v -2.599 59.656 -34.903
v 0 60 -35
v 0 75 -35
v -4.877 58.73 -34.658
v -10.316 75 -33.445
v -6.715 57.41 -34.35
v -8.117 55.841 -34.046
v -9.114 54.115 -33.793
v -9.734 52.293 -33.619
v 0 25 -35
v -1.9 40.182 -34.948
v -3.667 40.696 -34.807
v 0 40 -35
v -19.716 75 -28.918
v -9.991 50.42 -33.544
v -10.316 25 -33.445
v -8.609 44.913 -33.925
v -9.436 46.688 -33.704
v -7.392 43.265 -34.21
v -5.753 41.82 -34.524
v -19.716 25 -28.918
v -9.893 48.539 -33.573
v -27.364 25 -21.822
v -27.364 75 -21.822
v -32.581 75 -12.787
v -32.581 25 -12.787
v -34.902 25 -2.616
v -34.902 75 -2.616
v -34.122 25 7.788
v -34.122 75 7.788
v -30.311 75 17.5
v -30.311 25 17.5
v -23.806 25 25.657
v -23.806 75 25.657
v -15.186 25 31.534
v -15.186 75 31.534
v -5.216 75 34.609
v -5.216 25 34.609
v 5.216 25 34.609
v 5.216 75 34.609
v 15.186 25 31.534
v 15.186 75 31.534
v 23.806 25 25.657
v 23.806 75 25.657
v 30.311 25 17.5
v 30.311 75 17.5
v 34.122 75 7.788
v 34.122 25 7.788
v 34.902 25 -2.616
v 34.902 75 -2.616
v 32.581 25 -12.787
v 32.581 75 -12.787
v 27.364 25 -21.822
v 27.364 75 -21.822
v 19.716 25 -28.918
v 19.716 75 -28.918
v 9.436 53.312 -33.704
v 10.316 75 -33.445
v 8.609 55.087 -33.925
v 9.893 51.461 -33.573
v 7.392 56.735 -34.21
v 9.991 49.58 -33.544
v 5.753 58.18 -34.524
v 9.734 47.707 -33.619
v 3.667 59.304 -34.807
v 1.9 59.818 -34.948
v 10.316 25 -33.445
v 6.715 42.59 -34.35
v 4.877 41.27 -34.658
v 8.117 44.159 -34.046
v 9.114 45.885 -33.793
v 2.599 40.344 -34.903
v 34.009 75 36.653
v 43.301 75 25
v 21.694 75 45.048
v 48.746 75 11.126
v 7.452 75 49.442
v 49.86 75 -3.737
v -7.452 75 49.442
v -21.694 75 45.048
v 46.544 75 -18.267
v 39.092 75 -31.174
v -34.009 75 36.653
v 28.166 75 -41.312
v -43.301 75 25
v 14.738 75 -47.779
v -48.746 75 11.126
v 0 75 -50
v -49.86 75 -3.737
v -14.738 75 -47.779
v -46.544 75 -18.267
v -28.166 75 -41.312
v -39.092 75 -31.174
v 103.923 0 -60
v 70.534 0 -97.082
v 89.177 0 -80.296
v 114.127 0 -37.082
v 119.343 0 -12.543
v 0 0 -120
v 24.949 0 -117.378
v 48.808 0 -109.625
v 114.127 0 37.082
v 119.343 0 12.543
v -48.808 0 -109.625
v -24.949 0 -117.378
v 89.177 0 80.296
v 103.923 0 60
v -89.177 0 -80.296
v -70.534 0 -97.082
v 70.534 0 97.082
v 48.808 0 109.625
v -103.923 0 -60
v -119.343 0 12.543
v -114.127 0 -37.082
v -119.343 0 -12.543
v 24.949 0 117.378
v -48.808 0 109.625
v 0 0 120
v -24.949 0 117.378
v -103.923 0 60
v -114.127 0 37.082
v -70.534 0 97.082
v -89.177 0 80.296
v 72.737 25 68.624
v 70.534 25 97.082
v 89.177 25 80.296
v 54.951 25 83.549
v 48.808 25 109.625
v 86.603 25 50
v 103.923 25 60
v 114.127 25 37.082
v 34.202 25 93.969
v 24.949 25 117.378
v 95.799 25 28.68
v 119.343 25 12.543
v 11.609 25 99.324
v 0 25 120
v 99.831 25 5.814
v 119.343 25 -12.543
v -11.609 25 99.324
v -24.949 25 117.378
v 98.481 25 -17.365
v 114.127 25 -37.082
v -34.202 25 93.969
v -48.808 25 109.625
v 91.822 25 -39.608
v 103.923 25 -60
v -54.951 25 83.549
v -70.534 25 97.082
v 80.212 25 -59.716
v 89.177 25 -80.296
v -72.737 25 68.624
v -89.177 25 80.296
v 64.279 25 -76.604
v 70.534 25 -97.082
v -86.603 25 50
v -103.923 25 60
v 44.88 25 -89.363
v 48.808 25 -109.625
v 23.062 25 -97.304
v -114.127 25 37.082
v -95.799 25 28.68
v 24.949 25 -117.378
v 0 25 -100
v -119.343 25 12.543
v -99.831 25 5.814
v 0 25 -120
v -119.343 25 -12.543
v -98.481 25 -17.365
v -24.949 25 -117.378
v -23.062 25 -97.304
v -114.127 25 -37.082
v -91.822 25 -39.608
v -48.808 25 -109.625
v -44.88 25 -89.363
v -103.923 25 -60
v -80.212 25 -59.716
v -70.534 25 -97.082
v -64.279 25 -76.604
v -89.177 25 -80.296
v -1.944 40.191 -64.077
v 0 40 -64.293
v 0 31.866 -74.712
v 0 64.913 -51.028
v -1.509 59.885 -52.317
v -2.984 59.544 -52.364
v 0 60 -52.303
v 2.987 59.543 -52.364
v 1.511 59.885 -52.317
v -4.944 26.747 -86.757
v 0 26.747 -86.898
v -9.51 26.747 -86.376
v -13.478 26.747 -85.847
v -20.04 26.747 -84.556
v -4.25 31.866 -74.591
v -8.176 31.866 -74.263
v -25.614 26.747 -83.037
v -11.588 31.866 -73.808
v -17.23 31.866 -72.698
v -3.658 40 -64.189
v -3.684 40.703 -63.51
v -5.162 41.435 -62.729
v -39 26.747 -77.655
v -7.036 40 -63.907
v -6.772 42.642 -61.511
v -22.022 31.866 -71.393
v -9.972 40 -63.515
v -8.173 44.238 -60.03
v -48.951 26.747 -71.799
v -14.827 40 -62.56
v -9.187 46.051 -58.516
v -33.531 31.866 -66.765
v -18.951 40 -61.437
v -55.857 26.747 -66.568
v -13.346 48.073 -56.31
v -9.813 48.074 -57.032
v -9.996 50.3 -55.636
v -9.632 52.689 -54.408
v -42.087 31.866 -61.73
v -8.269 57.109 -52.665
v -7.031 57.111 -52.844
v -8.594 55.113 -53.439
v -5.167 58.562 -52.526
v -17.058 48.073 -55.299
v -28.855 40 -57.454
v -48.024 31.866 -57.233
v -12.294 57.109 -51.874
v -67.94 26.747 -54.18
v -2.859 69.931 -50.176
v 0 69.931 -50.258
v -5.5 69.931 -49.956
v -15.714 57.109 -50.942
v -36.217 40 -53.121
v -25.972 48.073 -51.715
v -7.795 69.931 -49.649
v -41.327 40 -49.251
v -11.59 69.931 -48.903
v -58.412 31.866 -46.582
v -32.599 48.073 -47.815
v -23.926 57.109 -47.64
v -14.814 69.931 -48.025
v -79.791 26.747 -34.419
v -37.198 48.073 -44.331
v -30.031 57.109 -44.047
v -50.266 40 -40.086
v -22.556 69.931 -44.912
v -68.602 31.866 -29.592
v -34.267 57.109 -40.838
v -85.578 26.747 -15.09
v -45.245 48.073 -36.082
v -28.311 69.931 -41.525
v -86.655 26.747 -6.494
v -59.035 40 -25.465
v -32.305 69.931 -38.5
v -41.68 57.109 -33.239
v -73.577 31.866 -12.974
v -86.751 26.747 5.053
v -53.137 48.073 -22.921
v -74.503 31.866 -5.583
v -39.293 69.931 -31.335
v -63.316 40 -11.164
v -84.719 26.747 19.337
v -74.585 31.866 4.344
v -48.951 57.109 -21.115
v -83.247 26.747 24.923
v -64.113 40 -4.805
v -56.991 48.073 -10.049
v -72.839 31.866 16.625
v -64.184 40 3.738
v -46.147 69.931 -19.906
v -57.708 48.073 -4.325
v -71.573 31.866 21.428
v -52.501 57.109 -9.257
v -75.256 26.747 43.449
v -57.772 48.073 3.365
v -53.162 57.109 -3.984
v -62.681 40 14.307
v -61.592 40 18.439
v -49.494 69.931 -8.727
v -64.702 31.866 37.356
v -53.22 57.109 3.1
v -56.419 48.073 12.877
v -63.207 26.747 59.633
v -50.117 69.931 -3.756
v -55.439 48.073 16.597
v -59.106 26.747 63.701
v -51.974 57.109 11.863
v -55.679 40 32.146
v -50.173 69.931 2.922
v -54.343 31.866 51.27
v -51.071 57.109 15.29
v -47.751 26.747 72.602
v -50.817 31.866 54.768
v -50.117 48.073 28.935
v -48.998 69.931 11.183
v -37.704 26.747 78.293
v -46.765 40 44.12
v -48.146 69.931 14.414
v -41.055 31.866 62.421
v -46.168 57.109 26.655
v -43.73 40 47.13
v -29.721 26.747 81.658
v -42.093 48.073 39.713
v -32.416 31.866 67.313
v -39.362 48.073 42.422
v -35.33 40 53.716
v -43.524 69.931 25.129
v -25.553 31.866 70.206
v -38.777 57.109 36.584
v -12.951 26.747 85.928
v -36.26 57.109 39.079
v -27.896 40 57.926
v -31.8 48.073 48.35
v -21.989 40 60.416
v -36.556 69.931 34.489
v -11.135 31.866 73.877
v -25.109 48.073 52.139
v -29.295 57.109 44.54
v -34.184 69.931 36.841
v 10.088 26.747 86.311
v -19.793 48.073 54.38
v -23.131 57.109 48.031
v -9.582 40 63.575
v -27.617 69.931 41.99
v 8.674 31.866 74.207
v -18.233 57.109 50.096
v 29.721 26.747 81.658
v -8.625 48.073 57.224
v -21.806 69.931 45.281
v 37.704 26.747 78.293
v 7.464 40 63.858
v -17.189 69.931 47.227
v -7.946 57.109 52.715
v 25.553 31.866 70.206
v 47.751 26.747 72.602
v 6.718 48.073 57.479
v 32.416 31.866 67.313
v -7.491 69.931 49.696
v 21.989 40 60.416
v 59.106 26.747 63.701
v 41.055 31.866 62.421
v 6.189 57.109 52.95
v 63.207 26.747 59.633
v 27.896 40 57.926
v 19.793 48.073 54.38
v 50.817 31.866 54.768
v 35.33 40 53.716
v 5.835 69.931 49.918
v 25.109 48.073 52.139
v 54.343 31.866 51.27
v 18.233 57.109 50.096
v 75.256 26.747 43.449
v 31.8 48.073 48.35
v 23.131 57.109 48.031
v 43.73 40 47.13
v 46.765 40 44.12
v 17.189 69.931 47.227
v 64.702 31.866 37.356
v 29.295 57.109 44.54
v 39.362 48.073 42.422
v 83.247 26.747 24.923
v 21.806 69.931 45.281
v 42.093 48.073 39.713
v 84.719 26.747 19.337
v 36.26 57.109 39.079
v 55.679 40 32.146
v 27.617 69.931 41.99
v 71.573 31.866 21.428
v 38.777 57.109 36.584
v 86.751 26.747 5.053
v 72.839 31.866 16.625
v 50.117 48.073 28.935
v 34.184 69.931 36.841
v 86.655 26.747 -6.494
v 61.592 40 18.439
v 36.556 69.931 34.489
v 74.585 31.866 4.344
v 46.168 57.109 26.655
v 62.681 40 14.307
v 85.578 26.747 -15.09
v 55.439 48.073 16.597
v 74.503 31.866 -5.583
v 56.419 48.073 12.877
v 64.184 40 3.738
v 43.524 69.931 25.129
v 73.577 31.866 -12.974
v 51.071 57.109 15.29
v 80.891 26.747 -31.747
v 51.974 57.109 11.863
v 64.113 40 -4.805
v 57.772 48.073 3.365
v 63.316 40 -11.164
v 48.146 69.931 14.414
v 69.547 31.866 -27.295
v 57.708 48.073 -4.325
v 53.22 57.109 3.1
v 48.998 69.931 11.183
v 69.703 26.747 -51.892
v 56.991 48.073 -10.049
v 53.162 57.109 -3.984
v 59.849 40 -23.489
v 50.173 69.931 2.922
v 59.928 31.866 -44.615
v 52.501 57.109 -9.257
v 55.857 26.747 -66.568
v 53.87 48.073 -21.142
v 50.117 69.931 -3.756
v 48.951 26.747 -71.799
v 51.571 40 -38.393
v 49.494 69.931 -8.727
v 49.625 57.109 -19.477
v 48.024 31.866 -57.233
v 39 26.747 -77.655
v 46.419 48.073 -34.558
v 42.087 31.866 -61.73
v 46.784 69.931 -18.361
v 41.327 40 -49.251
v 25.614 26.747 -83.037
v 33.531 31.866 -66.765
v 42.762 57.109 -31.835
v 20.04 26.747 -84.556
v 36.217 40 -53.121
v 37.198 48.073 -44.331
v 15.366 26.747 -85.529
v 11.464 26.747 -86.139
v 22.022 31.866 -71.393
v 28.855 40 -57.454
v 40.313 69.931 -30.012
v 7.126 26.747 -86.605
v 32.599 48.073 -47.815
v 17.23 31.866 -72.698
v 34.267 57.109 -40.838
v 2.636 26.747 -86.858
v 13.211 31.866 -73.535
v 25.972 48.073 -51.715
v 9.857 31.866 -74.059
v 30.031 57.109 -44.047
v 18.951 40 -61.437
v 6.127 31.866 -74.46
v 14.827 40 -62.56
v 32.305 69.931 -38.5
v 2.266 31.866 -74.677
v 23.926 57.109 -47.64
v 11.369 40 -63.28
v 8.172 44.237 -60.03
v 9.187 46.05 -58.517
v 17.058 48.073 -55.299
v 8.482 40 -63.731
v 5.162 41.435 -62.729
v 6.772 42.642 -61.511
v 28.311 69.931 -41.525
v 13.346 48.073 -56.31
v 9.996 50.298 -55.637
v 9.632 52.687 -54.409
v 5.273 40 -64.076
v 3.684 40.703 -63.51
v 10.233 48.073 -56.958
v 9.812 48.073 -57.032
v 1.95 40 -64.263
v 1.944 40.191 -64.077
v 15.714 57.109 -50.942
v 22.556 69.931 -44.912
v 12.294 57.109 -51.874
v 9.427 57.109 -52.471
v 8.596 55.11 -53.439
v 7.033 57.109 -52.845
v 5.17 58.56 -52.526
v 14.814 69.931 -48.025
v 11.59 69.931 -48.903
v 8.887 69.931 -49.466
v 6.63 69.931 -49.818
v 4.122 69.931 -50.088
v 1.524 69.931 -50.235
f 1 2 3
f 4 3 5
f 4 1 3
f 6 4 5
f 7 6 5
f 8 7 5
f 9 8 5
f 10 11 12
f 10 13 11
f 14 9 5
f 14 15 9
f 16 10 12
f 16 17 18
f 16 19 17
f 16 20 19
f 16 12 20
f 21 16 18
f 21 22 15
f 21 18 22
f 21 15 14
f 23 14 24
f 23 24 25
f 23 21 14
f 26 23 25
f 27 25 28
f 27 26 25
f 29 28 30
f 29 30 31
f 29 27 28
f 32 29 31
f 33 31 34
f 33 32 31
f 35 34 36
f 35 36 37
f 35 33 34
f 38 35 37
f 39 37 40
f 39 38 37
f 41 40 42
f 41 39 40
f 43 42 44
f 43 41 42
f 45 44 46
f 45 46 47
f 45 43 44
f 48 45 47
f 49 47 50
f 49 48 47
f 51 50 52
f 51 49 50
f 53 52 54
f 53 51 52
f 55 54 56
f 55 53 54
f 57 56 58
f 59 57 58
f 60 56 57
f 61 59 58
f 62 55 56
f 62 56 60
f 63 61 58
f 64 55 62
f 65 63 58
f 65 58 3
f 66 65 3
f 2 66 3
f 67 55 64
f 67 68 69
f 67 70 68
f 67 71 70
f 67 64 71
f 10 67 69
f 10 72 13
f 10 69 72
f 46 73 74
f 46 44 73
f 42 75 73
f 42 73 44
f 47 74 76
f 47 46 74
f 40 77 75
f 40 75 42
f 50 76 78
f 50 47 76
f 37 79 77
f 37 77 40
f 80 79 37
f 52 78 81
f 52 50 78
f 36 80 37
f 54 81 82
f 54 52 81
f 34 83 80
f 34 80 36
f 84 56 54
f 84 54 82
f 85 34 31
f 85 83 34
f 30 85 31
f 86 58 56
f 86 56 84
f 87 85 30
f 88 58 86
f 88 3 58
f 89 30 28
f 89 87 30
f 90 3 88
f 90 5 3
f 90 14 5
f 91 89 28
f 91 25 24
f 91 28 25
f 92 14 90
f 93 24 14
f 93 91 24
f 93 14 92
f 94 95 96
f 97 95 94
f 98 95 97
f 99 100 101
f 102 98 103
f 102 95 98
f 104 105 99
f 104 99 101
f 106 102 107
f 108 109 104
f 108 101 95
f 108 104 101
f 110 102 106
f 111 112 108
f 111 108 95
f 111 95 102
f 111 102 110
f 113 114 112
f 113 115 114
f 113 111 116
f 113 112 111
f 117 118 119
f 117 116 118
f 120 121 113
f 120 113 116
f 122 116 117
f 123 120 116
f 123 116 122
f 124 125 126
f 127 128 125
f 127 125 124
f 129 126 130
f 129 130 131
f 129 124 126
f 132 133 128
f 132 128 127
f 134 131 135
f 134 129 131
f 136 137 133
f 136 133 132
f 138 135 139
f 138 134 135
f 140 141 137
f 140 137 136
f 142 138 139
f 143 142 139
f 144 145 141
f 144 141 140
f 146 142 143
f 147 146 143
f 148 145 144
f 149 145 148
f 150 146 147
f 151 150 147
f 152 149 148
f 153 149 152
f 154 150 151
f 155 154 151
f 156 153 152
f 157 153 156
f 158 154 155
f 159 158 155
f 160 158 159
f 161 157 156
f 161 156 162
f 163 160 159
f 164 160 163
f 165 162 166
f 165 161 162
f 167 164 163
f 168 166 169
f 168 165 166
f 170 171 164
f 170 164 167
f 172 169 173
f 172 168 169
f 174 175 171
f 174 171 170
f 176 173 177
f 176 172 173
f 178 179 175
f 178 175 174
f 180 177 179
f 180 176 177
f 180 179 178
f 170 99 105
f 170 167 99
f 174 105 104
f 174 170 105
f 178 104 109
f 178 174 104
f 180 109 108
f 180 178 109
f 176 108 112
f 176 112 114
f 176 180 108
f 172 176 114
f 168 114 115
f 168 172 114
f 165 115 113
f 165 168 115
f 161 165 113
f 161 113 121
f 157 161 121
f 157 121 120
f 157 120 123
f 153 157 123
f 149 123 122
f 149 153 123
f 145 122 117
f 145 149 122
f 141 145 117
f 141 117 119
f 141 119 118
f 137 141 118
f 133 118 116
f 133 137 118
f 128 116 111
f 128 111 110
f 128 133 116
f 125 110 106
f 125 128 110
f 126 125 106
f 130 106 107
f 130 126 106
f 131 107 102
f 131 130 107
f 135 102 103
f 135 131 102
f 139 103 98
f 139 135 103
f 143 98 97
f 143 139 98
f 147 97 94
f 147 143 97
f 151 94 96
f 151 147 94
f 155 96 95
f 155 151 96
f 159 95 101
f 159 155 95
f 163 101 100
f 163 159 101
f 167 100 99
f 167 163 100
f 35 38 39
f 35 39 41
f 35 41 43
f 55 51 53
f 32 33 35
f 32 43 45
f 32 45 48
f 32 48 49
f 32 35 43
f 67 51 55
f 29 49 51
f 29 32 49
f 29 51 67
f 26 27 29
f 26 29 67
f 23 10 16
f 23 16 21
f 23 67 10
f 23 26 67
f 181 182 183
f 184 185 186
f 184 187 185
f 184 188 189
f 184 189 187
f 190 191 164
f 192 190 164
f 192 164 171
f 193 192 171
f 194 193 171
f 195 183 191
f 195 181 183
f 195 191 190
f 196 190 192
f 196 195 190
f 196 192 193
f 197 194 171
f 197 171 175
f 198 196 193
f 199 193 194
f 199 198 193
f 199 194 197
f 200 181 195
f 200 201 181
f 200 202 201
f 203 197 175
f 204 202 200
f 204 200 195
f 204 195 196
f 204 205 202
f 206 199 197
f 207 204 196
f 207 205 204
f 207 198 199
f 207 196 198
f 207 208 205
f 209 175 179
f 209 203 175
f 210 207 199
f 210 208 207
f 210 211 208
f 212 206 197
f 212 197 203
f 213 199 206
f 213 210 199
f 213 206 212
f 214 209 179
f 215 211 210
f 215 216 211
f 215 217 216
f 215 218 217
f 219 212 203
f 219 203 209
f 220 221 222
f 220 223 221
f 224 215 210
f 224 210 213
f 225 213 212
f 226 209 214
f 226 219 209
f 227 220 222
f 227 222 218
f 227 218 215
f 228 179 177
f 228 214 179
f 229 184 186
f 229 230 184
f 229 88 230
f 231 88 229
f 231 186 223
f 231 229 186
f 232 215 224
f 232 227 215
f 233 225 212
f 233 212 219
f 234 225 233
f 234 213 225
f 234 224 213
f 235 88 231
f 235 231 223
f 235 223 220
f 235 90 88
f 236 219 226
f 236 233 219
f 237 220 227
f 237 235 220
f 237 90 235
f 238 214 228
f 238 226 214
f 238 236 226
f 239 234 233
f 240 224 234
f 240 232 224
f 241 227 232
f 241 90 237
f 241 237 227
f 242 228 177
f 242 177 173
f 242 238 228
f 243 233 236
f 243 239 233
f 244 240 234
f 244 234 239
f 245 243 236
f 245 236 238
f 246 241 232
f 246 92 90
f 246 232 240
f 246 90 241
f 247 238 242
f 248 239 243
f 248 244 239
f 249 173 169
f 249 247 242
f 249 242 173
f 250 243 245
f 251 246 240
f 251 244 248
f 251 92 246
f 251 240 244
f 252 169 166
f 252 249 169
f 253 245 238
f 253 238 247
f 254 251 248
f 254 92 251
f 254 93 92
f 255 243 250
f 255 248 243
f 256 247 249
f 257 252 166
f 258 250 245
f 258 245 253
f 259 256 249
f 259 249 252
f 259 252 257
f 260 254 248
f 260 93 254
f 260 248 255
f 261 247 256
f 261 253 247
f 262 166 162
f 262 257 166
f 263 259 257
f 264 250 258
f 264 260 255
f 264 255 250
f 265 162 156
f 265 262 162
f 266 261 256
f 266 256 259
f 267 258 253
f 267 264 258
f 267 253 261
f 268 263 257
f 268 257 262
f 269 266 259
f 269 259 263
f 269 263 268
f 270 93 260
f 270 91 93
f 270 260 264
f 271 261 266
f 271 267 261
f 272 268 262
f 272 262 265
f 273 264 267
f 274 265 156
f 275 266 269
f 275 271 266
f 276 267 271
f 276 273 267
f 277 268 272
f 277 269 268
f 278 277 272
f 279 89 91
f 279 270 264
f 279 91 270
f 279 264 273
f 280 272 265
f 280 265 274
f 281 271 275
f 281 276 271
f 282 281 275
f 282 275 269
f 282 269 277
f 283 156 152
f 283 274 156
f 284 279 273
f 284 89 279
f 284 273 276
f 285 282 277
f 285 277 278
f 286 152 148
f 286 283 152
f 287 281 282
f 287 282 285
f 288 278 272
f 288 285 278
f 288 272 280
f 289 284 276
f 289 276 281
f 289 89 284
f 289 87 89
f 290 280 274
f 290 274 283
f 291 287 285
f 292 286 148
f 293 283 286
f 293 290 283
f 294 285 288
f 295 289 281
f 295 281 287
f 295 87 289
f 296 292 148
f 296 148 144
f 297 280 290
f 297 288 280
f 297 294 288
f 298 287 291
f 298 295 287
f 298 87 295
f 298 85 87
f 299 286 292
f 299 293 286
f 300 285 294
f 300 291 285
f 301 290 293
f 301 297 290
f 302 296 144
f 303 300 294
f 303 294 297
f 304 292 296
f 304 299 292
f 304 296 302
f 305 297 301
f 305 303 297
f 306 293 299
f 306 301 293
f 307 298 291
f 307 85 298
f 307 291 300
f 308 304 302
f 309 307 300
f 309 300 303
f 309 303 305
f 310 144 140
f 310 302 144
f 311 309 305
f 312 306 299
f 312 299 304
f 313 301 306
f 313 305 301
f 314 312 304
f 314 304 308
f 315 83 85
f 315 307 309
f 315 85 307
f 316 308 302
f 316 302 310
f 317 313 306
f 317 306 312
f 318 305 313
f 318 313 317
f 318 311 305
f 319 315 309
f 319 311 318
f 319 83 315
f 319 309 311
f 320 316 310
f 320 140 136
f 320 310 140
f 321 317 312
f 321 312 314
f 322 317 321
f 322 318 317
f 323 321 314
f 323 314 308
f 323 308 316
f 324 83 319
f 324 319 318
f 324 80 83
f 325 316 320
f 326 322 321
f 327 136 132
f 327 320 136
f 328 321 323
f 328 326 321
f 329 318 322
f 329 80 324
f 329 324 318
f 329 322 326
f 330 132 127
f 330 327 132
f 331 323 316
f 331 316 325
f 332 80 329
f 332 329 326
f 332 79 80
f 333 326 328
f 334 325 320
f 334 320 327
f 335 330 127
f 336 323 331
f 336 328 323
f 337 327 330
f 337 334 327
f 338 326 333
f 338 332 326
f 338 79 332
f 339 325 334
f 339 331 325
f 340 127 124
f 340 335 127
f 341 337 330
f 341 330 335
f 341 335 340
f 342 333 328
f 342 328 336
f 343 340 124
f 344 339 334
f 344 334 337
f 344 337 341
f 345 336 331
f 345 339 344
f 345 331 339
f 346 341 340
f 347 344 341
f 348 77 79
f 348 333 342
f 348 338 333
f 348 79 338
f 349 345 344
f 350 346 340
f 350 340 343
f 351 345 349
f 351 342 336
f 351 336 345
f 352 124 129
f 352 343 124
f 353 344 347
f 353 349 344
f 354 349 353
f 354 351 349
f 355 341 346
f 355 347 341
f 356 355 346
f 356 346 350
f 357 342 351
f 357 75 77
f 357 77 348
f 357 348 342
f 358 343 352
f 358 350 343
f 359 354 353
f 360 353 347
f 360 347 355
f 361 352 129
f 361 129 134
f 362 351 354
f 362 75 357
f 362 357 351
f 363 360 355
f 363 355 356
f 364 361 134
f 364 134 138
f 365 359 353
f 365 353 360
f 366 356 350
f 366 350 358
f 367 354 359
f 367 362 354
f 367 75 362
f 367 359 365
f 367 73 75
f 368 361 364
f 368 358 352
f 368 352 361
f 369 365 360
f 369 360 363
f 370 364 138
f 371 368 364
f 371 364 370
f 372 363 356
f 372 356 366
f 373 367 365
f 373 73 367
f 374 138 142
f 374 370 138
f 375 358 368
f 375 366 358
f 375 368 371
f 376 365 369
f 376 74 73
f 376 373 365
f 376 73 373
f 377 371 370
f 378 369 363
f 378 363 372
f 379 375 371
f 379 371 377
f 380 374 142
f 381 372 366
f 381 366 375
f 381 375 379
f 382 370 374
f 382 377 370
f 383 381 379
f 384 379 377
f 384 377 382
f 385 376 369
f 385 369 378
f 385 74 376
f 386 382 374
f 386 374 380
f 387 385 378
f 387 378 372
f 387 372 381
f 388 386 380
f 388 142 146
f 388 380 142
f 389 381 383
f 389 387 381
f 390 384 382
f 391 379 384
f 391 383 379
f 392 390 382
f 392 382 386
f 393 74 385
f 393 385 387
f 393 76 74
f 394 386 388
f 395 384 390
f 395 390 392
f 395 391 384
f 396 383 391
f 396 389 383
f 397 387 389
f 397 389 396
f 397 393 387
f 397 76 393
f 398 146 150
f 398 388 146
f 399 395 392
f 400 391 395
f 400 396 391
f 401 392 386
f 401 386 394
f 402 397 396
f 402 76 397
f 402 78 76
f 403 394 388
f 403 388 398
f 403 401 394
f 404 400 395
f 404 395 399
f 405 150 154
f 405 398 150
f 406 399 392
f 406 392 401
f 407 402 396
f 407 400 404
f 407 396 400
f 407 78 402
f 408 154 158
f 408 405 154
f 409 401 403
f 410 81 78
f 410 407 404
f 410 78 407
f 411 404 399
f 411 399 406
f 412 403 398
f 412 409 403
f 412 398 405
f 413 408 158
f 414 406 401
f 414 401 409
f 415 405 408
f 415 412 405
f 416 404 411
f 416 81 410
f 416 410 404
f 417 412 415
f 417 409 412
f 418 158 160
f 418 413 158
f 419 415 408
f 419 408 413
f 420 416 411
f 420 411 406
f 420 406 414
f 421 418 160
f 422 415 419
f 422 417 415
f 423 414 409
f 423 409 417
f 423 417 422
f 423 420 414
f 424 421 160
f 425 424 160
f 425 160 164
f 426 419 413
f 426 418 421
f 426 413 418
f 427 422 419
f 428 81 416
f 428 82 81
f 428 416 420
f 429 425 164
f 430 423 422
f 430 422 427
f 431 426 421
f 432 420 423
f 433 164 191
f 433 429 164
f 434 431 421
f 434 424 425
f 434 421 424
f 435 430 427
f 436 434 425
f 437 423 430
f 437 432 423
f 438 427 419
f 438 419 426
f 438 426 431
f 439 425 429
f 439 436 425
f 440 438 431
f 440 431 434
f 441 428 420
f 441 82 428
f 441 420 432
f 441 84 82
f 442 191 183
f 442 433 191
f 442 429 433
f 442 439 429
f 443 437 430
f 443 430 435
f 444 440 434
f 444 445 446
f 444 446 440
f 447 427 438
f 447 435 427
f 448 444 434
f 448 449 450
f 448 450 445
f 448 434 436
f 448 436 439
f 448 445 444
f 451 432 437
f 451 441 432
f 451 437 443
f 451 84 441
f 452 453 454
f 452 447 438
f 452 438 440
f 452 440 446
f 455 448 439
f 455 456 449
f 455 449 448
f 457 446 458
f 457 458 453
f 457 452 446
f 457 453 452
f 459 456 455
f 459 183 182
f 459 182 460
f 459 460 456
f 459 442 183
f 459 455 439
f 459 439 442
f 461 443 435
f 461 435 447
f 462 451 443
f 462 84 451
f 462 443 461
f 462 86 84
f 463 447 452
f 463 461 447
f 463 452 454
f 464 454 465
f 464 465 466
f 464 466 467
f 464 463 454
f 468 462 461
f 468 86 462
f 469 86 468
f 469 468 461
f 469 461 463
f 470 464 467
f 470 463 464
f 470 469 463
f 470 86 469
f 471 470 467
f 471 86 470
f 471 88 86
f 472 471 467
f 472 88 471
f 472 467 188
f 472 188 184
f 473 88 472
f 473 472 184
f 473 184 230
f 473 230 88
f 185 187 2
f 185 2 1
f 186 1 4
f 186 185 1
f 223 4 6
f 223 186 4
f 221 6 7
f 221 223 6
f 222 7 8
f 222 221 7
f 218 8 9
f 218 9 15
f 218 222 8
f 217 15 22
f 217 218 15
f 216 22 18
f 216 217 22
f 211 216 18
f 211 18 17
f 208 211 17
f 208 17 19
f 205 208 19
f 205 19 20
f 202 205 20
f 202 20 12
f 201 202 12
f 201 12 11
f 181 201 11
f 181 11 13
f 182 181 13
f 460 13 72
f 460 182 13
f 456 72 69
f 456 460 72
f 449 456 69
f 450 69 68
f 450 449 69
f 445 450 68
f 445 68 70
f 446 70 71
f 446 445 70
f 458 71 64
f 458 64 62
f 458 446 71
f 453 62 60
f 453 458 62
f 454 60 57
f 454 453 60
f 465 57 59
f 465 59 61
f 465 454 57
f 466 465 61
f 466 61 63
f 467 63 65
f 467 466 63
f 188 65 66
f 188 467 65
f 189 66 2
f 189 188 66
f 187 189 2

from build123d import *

# Parameters (mm, degrees)
CUT_EXTRUDE_2_DEPTH      = 30
CUT_EXTRUDE_2_DEPTH_BACK = 214.600093633
SKETCH_3_R               = 10


with BuildPart() as part:
    # Эскиз1 → Повернуть3 (revolve)
    with BuildSketch(Plane.XY):
        with BuildLine():
            Line((-120, 0), (-120, 25))
            Line((-120, 25), (-100, 25))
            ThreePointArc((-100, 25), (-64.644660941, 39.644660941), (-50, 75))
            Line((-50, 75), (-35, 75))
            Line((-35, 75), (-35, 25))
            Line((-35, 25), (0, 25))
            Line((0, 25), (0, 0))
            Line((0, 0), (-120, 0))
        make_face()
    revolve(axis=Axis((0, 0, 0), (0, 1, 0)))

    # Эскиз3 → Вырез-Вытянуть2 (cut, two sides: drawn at the far end of the back side and taken through both)
    with BuildSketch(Plane.XY.offset(-40).offset(-CUT_EXTRUDE_2_DEPTH_BACK)):
        with Locations((0, 50)):
            Circle(SKETCH_3_R)
    extrude(amount=CUT_EXTRUDE_2_DEPTH + CUT_EXTRUDE_2_DEPTH_BACK, mode=Mode.SUBTRACT)


solid = part.part
